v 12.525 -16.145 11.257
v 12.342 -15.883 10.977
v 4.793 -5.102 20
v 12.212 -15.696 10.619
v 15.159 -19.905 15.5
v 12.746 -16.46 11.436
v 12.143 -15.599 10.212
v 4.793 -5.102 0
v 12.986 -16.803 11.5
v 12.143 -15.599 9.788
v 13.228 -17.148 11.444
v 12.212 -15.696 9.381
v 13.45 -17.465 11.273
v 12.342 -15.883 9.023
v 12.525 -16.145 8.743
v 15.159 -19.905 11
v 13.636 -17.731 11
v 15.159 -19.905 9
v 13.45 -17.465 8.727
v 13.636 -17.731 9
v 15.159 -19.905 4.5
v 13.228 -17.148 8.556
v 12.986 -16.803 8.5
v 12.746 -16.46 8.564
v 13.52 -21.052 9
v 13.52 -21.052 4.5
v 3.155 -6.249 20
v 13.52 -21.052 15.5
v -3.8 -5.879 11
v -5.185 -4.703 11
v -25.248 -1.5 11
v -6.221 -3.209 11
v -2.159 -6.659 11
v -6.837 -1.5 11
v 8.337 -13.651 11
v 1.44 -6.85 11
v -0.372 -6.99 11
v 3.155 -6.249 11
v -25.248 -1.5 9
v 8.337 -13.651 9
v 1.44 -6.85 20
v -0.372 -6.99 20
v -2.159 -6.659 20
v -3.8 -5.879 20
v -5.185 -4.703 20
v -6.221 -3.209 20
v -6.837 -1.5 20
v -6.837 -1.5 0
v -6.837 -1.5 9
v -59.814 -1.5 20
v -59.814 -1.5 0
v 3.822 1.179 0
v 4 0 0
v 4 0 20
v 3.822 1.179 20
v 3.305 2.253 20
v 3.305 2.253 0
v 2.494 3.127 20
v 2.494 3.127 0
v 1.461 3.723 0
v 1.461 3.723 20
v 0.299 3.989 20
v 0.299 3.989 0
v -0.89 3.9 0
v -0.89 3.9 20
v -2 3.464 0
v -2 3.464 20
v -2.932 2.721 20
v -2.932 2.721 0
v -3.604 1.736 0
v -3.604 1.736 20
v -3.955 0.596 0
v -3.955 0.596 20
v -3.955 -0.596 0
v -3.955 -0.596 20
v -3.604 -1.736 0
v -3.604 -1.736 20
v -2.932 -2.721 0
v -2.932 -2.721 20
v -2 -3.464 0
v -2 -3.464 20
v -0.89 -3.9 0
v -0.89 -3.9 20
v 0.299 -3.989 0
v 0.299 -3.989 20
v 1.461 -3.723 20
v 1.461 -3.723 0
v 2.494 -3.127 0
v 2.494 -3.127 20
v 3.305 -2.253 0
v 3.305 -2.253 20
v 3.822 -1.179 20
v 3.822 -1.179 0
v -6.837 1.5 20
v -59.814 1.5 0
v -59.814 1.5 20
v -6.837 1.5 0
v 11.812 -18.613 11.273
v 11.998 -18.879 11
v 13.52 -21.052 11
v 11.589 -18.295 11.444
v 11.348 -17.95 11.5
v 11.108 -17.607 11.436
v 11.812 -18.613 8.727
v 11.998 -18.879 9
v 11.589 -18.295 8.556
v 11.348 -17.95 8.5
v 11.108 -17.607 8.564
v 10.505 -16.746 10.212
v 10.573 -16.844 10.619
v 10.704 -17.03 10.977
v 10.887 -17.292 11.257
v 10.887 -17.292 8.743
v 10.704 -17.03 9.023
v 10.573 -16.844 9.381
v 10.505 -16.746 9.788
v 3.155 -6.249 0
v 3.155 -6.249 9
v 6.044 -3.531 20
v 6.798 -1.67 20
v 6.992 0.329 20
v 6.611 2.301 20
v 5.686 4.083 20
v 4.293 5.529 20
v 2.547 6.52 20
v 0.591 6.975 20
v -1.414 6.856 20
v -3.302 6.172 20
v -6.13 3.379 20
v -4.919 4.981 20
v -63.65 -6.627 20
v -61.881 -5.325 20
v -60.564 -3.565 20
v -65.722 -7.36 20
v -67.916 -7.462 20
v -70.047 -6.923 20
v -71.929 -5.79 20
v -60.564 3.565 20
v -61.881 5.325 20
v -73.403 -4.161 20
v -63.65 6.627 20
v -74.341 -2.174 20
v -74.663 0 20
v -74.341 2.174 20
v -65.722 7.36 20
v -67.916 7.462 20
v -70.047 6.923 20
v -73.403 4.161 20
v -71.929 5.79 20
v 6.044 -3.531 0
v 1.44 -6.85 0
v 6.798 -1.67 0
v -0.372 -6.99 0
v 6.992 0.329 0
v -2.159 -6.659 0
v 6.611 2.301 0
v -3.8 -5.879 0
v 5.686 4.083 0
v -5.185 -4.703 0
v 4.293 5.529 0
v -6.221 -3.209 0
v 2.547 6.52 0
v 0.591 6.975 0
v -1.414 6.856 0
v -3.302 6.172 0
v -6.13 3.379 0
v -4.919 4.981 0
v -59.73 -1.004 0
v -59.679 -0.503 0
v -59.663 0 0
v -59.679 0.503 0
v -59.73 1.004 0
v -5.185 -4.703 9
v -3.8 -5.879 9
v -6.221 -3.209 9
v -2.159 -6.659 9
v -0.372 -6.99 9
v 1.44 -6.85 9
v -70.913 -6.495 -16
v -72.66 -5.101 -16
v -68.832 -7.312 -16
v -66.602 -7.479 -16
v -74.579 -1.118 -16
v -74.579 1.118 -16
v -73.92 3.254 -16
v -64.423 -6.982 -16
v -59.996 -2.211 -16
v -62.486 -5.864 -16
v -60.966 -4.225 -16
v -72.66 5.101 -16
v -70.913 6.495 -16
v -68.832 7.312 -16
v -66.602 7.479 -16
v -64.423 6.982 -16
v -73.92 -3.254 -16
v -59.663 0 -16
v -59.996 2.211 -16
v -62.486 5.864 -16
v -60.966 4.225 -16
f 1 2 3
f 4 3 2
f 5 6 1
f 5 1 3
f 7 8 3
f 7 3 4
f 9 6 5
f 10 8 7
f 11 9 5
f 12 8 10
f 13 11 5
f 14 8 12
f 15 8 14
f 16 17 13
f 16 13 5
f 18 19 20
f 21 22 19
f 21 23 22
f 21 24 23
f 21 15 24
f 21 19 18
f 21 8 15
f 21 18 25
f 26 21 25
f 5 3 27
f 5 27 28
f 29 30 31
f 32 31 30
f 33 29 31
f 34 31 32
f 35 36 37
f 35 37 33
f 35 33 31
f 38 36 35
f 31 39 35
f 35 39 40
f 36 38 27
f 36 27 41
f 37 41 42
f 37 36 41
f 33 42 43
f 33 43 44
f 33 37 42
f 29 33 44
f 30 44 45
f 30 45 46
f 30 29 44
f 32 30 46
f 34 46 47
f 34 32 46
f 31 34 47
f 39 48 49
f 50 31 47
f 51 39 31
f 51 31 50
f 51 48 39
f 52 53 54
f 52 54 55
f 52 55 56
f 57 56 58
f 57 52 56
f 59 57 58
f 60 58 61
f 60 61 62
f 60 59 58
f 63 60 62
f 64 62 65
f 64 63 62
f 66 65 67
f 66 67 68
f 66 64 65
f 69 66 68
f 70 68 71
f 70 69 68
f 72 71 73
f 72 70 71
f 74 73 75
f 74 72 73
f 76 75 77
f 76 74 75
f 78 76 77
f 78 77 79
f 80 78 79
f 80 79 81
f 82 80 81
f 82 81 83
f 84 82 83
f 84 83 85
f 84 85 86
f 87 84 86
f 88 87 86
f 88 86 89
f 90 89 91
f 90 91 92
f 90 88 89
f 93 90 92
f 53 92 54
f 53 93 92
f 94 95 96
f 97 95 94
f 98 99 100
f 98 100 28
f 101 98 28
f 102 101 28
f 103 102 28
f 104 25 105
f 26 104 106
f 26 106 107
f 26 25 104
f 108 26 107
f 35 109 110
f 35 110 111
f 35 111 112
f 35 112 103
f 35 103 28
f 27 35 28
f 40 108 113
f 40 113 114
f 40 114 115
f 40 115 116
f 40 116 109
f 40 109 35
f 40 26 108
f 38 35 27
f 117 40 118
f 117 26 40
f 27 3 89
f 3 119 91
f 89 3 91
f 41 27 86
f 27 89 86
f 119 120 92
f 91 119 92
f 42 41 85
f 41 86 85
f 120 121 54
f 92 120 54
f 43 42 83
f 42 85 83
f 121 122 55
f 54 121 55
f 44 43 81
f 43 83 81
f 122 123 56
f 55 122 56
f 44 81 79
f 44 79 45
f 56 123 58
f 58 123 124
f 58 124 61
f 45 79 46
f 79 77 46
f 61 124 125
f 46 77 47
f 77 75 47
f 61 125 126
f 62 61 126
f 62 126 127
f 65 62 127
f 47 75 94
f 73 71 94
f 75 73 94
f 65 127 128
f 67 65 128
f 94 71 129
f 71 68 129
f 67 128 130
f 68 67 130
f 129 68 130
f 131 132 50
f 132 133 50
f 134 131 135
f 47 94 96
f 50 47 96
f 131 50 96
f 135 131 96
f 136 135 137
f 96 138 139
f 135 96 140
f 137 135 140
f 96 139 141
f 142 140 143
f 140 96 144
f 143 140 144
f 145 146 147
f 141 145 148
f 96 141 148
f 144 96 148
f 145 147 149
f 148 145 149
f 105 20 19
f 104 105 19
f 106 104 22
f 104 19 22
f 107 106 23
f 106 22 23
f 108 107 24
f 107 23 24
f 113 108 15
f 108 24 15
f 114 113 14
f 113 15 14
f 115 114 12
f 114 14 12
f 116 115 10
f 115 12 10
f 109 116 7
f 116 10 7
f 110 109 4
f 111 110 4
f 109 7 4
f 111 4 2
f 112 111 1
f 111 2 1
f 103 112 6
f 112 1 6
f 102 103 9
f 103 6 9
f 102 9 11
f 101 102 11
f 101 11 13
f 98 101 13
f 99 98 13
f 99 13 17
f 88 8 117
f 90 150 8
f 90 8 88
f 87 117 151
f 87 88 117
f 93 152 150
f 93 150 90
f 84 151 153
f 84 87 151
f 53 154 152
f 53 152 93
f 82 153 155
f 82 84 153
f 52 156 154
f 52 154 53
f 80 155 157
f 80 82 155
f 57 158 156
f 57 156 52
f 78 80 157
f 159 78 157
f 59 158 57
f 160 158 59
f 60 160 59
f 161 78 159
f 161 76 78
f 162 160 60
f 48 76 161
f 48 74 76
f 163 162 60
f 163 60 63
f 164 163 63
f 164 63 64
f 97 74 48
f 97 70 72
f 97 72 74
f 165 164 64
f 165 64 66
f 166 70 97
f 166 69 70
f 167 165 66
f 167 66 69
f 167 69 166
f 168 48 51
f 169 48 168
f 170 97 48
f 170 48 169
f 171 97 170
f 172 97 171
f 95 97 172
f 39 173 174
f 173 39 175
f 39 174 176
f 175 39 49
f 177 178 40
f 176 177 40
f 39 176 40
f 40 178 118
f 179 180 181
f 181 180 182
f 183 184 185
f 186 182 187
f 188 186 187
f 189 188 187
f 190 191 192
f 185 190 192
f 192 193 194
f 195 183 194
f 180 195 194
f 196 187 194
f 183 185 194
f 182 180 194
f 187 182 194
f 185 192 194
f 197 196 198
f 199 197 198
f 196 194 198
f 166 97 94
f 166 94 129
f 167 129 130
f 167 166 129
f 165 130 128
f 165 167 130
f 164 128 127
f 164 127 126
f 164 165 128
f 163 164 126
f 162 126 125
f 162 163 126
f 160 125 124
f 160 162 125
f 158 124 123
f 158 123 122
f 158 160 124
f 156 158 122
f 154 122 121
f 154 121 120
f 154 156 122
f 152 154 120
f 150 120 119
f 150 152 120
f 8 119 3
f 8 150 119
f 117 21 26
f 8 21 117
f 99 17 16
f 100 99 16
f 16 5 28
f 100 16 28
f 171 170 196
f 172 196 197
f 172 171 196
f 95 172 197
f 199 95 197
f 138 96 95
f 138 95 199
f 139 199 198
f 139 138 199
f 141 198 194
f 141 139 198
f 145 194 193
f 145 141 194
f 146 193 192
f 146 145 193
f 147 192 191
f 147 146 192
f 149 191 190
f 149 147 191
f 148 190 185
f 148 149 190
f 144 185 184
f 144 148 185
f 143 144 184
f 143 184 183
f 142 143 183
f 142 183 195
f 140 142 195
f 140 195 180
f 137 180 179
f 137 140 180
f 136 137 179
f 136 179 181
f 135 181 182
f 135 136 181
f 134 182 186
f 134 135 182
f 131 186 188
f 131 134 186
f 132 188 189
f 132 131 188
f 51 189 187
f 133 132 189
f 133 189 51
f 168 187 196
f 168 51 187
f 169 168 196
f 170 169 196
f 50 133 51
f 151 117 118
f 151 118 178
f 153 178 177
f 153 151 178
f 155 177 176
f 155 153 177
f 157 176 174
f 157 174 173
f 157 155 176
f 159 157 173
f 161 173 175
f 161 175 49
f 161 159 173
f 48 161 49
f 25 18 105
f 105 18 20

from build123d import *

# Parameters (mm, degrees)
SKETCH2_R           = 4
BOSS_EXTRUDE1_DEPTH = 20
SKETCH3_R           = 7.5
BOSS_EXTRUDE2_DEPTH = 36
BOSS_EXTRUDE3_START = -20
BOSS_EXTRUDE3_DEPTH = 20
CUT_EXTRUDE1_DEPTH  = 2
CUT_EXTRUDE2_REACH  = 83.026
BOSS_EXTRUDE4_DEPTH = 2


with BuildPart() as part:
    # Sketch2 → Boss-Extrude1 (new body)
    with BuildSketch(Plane.XY):
        with BuildLine():
            Line((-67.162602834, 1.5), (-6.837397166, 1.5))
            ThreePointArc((-6.837397166, 1.5), (7, 0), (-6.837397166, -1.5))
            Line((-6.837397166, -1.5), (-67.162602834, -1.5))
            Line((-67.162602834, -1.5), (-67.162602834, 1.5))
        make_face()
        Circle(SKETCH2_R, mode=Mode.SUBTRACT)
    extrude(amount=BOSS_EXTRUDE1_DEPTH)

    # Sketch3 → Boss-Extrude2 (add)
    with BuildSketch(Plane.XY.offset(20)):
        with Locations((-67.162602834, 0)):
            Circle(SKETCH3_R)
    extrude(amount=-BOSS_EXTRUDE2_DEPTH)

    # Sketch4 → Boss-Extrude3 (add)
    with BuildSketch(Plane.XY.offset(20).offset(BOSS_EXTRUDE3_START)):
        with BuildLine():
            Line((15.158562953, -19.905224671), (13.520258864, -21.052377544))
            Line((13.520258864, -21.052377544), (3.154702075, -6.248828276))
            ThreePointArc((3.154702075, -6.248828276), (4.015035054, -5.73406431), (4.793006163, -5.101675403))
            Line((4.793006163, -5.101675403), (15.158562953, -19.905224671))
        make_face()
    extrude(amount=BOSS_EXTRUDE3_DEPTH)

    # Sketch5 → Cut-Extrude1 (cut)
    with BuildSketch(Plane(origin=(0.8191520442889967, 0.5735764363510467, 0), x_dir=(0, 0, -1), z_dir=(0.8191520442889931, 0.5735764363510442, 0))):
        with BuildLine():
            Line((-11, -22.346237219), (-11, -25))
            Line((-11, -25), (-9, -25))
            Line((-9, -25), (-9, -22.346237219))
            ThreePointArc((-9, -22.346237219), (-10, -19.72820323), (-11, -22.346237219))
        make_face()
    extrude(amount=-CUT_EXTRUDE1_DEPTH, mode=Mode.SUBTRACT)

    # Sketch6 → Cut-Extrude2 (cut, up to next)
    with BuildSketch(Plane(origin=(0.8191520442889967, 0.5735764363510467, 0), x_dir=(0, 0, -1), z_dir=(0.8191520442889931, 0.5735764363510442, 0)), mode=Mode.PRIVATE) as cut_extrude2_sk1:
        Polygon((-20, -6.92820323), (-15.5, -25), (-21.37977423, -25), (-21.37977423, -6.621098629), align=None)
    cut_extrude2_tool1 = extrude(cut_extrude2_sk1.sketch, amount=-CUT_EXTRUDE2_REACH, mode=Mode.PRIVATE) & part.part
    # Sketch6 → Cut-Extrude2 (cut, up to next)
    with BuildSketch(Plane(origin=(0.8191520442889967, 0.5735764363510467, 0), x_dir=(0, 0, -1), z_dir=(0.8191520442889931, 0.5735764363510442, 0)), mode=Mode.PRIVATE) as cut_extrude2_sk2:
        Polygon((0, -6.92820323), (1.41409792, -6.92820323), (1.41409792, -25), (-4.5, -25), align=None)
    cut_extrude2_tool2 = extrude(cut_extrude2_sk2.sketch, amount=-CUT_EXTRUDE2_REACH, mode=Mode.PRIVATE) & part.part
    add(cut_extrude2_tool1.solids().sort_by_distance((11.026351, -14.003814, 19.337545))[0], mode=Mode.SUBTRACT)
    add(cut_extrude2_tool2.solids().sort_by_distance((11.036642, -14.018511, 0.648226))[0], mode=Mode.SUBTRACT)

    # Sketch7 → Boss-Extrude4 (add)
    with BuildSketch(Plane.XY.offset(9)):
        Polygon((-25.248427633, -1.5), (8.33748047, -13.65060291), (3.154702075, -6.248828276), (-6.837397166, -1.5), align=None)
    extrude(amount=BOSS_EXTRUDE4_DEPTH)


solid = part.part
